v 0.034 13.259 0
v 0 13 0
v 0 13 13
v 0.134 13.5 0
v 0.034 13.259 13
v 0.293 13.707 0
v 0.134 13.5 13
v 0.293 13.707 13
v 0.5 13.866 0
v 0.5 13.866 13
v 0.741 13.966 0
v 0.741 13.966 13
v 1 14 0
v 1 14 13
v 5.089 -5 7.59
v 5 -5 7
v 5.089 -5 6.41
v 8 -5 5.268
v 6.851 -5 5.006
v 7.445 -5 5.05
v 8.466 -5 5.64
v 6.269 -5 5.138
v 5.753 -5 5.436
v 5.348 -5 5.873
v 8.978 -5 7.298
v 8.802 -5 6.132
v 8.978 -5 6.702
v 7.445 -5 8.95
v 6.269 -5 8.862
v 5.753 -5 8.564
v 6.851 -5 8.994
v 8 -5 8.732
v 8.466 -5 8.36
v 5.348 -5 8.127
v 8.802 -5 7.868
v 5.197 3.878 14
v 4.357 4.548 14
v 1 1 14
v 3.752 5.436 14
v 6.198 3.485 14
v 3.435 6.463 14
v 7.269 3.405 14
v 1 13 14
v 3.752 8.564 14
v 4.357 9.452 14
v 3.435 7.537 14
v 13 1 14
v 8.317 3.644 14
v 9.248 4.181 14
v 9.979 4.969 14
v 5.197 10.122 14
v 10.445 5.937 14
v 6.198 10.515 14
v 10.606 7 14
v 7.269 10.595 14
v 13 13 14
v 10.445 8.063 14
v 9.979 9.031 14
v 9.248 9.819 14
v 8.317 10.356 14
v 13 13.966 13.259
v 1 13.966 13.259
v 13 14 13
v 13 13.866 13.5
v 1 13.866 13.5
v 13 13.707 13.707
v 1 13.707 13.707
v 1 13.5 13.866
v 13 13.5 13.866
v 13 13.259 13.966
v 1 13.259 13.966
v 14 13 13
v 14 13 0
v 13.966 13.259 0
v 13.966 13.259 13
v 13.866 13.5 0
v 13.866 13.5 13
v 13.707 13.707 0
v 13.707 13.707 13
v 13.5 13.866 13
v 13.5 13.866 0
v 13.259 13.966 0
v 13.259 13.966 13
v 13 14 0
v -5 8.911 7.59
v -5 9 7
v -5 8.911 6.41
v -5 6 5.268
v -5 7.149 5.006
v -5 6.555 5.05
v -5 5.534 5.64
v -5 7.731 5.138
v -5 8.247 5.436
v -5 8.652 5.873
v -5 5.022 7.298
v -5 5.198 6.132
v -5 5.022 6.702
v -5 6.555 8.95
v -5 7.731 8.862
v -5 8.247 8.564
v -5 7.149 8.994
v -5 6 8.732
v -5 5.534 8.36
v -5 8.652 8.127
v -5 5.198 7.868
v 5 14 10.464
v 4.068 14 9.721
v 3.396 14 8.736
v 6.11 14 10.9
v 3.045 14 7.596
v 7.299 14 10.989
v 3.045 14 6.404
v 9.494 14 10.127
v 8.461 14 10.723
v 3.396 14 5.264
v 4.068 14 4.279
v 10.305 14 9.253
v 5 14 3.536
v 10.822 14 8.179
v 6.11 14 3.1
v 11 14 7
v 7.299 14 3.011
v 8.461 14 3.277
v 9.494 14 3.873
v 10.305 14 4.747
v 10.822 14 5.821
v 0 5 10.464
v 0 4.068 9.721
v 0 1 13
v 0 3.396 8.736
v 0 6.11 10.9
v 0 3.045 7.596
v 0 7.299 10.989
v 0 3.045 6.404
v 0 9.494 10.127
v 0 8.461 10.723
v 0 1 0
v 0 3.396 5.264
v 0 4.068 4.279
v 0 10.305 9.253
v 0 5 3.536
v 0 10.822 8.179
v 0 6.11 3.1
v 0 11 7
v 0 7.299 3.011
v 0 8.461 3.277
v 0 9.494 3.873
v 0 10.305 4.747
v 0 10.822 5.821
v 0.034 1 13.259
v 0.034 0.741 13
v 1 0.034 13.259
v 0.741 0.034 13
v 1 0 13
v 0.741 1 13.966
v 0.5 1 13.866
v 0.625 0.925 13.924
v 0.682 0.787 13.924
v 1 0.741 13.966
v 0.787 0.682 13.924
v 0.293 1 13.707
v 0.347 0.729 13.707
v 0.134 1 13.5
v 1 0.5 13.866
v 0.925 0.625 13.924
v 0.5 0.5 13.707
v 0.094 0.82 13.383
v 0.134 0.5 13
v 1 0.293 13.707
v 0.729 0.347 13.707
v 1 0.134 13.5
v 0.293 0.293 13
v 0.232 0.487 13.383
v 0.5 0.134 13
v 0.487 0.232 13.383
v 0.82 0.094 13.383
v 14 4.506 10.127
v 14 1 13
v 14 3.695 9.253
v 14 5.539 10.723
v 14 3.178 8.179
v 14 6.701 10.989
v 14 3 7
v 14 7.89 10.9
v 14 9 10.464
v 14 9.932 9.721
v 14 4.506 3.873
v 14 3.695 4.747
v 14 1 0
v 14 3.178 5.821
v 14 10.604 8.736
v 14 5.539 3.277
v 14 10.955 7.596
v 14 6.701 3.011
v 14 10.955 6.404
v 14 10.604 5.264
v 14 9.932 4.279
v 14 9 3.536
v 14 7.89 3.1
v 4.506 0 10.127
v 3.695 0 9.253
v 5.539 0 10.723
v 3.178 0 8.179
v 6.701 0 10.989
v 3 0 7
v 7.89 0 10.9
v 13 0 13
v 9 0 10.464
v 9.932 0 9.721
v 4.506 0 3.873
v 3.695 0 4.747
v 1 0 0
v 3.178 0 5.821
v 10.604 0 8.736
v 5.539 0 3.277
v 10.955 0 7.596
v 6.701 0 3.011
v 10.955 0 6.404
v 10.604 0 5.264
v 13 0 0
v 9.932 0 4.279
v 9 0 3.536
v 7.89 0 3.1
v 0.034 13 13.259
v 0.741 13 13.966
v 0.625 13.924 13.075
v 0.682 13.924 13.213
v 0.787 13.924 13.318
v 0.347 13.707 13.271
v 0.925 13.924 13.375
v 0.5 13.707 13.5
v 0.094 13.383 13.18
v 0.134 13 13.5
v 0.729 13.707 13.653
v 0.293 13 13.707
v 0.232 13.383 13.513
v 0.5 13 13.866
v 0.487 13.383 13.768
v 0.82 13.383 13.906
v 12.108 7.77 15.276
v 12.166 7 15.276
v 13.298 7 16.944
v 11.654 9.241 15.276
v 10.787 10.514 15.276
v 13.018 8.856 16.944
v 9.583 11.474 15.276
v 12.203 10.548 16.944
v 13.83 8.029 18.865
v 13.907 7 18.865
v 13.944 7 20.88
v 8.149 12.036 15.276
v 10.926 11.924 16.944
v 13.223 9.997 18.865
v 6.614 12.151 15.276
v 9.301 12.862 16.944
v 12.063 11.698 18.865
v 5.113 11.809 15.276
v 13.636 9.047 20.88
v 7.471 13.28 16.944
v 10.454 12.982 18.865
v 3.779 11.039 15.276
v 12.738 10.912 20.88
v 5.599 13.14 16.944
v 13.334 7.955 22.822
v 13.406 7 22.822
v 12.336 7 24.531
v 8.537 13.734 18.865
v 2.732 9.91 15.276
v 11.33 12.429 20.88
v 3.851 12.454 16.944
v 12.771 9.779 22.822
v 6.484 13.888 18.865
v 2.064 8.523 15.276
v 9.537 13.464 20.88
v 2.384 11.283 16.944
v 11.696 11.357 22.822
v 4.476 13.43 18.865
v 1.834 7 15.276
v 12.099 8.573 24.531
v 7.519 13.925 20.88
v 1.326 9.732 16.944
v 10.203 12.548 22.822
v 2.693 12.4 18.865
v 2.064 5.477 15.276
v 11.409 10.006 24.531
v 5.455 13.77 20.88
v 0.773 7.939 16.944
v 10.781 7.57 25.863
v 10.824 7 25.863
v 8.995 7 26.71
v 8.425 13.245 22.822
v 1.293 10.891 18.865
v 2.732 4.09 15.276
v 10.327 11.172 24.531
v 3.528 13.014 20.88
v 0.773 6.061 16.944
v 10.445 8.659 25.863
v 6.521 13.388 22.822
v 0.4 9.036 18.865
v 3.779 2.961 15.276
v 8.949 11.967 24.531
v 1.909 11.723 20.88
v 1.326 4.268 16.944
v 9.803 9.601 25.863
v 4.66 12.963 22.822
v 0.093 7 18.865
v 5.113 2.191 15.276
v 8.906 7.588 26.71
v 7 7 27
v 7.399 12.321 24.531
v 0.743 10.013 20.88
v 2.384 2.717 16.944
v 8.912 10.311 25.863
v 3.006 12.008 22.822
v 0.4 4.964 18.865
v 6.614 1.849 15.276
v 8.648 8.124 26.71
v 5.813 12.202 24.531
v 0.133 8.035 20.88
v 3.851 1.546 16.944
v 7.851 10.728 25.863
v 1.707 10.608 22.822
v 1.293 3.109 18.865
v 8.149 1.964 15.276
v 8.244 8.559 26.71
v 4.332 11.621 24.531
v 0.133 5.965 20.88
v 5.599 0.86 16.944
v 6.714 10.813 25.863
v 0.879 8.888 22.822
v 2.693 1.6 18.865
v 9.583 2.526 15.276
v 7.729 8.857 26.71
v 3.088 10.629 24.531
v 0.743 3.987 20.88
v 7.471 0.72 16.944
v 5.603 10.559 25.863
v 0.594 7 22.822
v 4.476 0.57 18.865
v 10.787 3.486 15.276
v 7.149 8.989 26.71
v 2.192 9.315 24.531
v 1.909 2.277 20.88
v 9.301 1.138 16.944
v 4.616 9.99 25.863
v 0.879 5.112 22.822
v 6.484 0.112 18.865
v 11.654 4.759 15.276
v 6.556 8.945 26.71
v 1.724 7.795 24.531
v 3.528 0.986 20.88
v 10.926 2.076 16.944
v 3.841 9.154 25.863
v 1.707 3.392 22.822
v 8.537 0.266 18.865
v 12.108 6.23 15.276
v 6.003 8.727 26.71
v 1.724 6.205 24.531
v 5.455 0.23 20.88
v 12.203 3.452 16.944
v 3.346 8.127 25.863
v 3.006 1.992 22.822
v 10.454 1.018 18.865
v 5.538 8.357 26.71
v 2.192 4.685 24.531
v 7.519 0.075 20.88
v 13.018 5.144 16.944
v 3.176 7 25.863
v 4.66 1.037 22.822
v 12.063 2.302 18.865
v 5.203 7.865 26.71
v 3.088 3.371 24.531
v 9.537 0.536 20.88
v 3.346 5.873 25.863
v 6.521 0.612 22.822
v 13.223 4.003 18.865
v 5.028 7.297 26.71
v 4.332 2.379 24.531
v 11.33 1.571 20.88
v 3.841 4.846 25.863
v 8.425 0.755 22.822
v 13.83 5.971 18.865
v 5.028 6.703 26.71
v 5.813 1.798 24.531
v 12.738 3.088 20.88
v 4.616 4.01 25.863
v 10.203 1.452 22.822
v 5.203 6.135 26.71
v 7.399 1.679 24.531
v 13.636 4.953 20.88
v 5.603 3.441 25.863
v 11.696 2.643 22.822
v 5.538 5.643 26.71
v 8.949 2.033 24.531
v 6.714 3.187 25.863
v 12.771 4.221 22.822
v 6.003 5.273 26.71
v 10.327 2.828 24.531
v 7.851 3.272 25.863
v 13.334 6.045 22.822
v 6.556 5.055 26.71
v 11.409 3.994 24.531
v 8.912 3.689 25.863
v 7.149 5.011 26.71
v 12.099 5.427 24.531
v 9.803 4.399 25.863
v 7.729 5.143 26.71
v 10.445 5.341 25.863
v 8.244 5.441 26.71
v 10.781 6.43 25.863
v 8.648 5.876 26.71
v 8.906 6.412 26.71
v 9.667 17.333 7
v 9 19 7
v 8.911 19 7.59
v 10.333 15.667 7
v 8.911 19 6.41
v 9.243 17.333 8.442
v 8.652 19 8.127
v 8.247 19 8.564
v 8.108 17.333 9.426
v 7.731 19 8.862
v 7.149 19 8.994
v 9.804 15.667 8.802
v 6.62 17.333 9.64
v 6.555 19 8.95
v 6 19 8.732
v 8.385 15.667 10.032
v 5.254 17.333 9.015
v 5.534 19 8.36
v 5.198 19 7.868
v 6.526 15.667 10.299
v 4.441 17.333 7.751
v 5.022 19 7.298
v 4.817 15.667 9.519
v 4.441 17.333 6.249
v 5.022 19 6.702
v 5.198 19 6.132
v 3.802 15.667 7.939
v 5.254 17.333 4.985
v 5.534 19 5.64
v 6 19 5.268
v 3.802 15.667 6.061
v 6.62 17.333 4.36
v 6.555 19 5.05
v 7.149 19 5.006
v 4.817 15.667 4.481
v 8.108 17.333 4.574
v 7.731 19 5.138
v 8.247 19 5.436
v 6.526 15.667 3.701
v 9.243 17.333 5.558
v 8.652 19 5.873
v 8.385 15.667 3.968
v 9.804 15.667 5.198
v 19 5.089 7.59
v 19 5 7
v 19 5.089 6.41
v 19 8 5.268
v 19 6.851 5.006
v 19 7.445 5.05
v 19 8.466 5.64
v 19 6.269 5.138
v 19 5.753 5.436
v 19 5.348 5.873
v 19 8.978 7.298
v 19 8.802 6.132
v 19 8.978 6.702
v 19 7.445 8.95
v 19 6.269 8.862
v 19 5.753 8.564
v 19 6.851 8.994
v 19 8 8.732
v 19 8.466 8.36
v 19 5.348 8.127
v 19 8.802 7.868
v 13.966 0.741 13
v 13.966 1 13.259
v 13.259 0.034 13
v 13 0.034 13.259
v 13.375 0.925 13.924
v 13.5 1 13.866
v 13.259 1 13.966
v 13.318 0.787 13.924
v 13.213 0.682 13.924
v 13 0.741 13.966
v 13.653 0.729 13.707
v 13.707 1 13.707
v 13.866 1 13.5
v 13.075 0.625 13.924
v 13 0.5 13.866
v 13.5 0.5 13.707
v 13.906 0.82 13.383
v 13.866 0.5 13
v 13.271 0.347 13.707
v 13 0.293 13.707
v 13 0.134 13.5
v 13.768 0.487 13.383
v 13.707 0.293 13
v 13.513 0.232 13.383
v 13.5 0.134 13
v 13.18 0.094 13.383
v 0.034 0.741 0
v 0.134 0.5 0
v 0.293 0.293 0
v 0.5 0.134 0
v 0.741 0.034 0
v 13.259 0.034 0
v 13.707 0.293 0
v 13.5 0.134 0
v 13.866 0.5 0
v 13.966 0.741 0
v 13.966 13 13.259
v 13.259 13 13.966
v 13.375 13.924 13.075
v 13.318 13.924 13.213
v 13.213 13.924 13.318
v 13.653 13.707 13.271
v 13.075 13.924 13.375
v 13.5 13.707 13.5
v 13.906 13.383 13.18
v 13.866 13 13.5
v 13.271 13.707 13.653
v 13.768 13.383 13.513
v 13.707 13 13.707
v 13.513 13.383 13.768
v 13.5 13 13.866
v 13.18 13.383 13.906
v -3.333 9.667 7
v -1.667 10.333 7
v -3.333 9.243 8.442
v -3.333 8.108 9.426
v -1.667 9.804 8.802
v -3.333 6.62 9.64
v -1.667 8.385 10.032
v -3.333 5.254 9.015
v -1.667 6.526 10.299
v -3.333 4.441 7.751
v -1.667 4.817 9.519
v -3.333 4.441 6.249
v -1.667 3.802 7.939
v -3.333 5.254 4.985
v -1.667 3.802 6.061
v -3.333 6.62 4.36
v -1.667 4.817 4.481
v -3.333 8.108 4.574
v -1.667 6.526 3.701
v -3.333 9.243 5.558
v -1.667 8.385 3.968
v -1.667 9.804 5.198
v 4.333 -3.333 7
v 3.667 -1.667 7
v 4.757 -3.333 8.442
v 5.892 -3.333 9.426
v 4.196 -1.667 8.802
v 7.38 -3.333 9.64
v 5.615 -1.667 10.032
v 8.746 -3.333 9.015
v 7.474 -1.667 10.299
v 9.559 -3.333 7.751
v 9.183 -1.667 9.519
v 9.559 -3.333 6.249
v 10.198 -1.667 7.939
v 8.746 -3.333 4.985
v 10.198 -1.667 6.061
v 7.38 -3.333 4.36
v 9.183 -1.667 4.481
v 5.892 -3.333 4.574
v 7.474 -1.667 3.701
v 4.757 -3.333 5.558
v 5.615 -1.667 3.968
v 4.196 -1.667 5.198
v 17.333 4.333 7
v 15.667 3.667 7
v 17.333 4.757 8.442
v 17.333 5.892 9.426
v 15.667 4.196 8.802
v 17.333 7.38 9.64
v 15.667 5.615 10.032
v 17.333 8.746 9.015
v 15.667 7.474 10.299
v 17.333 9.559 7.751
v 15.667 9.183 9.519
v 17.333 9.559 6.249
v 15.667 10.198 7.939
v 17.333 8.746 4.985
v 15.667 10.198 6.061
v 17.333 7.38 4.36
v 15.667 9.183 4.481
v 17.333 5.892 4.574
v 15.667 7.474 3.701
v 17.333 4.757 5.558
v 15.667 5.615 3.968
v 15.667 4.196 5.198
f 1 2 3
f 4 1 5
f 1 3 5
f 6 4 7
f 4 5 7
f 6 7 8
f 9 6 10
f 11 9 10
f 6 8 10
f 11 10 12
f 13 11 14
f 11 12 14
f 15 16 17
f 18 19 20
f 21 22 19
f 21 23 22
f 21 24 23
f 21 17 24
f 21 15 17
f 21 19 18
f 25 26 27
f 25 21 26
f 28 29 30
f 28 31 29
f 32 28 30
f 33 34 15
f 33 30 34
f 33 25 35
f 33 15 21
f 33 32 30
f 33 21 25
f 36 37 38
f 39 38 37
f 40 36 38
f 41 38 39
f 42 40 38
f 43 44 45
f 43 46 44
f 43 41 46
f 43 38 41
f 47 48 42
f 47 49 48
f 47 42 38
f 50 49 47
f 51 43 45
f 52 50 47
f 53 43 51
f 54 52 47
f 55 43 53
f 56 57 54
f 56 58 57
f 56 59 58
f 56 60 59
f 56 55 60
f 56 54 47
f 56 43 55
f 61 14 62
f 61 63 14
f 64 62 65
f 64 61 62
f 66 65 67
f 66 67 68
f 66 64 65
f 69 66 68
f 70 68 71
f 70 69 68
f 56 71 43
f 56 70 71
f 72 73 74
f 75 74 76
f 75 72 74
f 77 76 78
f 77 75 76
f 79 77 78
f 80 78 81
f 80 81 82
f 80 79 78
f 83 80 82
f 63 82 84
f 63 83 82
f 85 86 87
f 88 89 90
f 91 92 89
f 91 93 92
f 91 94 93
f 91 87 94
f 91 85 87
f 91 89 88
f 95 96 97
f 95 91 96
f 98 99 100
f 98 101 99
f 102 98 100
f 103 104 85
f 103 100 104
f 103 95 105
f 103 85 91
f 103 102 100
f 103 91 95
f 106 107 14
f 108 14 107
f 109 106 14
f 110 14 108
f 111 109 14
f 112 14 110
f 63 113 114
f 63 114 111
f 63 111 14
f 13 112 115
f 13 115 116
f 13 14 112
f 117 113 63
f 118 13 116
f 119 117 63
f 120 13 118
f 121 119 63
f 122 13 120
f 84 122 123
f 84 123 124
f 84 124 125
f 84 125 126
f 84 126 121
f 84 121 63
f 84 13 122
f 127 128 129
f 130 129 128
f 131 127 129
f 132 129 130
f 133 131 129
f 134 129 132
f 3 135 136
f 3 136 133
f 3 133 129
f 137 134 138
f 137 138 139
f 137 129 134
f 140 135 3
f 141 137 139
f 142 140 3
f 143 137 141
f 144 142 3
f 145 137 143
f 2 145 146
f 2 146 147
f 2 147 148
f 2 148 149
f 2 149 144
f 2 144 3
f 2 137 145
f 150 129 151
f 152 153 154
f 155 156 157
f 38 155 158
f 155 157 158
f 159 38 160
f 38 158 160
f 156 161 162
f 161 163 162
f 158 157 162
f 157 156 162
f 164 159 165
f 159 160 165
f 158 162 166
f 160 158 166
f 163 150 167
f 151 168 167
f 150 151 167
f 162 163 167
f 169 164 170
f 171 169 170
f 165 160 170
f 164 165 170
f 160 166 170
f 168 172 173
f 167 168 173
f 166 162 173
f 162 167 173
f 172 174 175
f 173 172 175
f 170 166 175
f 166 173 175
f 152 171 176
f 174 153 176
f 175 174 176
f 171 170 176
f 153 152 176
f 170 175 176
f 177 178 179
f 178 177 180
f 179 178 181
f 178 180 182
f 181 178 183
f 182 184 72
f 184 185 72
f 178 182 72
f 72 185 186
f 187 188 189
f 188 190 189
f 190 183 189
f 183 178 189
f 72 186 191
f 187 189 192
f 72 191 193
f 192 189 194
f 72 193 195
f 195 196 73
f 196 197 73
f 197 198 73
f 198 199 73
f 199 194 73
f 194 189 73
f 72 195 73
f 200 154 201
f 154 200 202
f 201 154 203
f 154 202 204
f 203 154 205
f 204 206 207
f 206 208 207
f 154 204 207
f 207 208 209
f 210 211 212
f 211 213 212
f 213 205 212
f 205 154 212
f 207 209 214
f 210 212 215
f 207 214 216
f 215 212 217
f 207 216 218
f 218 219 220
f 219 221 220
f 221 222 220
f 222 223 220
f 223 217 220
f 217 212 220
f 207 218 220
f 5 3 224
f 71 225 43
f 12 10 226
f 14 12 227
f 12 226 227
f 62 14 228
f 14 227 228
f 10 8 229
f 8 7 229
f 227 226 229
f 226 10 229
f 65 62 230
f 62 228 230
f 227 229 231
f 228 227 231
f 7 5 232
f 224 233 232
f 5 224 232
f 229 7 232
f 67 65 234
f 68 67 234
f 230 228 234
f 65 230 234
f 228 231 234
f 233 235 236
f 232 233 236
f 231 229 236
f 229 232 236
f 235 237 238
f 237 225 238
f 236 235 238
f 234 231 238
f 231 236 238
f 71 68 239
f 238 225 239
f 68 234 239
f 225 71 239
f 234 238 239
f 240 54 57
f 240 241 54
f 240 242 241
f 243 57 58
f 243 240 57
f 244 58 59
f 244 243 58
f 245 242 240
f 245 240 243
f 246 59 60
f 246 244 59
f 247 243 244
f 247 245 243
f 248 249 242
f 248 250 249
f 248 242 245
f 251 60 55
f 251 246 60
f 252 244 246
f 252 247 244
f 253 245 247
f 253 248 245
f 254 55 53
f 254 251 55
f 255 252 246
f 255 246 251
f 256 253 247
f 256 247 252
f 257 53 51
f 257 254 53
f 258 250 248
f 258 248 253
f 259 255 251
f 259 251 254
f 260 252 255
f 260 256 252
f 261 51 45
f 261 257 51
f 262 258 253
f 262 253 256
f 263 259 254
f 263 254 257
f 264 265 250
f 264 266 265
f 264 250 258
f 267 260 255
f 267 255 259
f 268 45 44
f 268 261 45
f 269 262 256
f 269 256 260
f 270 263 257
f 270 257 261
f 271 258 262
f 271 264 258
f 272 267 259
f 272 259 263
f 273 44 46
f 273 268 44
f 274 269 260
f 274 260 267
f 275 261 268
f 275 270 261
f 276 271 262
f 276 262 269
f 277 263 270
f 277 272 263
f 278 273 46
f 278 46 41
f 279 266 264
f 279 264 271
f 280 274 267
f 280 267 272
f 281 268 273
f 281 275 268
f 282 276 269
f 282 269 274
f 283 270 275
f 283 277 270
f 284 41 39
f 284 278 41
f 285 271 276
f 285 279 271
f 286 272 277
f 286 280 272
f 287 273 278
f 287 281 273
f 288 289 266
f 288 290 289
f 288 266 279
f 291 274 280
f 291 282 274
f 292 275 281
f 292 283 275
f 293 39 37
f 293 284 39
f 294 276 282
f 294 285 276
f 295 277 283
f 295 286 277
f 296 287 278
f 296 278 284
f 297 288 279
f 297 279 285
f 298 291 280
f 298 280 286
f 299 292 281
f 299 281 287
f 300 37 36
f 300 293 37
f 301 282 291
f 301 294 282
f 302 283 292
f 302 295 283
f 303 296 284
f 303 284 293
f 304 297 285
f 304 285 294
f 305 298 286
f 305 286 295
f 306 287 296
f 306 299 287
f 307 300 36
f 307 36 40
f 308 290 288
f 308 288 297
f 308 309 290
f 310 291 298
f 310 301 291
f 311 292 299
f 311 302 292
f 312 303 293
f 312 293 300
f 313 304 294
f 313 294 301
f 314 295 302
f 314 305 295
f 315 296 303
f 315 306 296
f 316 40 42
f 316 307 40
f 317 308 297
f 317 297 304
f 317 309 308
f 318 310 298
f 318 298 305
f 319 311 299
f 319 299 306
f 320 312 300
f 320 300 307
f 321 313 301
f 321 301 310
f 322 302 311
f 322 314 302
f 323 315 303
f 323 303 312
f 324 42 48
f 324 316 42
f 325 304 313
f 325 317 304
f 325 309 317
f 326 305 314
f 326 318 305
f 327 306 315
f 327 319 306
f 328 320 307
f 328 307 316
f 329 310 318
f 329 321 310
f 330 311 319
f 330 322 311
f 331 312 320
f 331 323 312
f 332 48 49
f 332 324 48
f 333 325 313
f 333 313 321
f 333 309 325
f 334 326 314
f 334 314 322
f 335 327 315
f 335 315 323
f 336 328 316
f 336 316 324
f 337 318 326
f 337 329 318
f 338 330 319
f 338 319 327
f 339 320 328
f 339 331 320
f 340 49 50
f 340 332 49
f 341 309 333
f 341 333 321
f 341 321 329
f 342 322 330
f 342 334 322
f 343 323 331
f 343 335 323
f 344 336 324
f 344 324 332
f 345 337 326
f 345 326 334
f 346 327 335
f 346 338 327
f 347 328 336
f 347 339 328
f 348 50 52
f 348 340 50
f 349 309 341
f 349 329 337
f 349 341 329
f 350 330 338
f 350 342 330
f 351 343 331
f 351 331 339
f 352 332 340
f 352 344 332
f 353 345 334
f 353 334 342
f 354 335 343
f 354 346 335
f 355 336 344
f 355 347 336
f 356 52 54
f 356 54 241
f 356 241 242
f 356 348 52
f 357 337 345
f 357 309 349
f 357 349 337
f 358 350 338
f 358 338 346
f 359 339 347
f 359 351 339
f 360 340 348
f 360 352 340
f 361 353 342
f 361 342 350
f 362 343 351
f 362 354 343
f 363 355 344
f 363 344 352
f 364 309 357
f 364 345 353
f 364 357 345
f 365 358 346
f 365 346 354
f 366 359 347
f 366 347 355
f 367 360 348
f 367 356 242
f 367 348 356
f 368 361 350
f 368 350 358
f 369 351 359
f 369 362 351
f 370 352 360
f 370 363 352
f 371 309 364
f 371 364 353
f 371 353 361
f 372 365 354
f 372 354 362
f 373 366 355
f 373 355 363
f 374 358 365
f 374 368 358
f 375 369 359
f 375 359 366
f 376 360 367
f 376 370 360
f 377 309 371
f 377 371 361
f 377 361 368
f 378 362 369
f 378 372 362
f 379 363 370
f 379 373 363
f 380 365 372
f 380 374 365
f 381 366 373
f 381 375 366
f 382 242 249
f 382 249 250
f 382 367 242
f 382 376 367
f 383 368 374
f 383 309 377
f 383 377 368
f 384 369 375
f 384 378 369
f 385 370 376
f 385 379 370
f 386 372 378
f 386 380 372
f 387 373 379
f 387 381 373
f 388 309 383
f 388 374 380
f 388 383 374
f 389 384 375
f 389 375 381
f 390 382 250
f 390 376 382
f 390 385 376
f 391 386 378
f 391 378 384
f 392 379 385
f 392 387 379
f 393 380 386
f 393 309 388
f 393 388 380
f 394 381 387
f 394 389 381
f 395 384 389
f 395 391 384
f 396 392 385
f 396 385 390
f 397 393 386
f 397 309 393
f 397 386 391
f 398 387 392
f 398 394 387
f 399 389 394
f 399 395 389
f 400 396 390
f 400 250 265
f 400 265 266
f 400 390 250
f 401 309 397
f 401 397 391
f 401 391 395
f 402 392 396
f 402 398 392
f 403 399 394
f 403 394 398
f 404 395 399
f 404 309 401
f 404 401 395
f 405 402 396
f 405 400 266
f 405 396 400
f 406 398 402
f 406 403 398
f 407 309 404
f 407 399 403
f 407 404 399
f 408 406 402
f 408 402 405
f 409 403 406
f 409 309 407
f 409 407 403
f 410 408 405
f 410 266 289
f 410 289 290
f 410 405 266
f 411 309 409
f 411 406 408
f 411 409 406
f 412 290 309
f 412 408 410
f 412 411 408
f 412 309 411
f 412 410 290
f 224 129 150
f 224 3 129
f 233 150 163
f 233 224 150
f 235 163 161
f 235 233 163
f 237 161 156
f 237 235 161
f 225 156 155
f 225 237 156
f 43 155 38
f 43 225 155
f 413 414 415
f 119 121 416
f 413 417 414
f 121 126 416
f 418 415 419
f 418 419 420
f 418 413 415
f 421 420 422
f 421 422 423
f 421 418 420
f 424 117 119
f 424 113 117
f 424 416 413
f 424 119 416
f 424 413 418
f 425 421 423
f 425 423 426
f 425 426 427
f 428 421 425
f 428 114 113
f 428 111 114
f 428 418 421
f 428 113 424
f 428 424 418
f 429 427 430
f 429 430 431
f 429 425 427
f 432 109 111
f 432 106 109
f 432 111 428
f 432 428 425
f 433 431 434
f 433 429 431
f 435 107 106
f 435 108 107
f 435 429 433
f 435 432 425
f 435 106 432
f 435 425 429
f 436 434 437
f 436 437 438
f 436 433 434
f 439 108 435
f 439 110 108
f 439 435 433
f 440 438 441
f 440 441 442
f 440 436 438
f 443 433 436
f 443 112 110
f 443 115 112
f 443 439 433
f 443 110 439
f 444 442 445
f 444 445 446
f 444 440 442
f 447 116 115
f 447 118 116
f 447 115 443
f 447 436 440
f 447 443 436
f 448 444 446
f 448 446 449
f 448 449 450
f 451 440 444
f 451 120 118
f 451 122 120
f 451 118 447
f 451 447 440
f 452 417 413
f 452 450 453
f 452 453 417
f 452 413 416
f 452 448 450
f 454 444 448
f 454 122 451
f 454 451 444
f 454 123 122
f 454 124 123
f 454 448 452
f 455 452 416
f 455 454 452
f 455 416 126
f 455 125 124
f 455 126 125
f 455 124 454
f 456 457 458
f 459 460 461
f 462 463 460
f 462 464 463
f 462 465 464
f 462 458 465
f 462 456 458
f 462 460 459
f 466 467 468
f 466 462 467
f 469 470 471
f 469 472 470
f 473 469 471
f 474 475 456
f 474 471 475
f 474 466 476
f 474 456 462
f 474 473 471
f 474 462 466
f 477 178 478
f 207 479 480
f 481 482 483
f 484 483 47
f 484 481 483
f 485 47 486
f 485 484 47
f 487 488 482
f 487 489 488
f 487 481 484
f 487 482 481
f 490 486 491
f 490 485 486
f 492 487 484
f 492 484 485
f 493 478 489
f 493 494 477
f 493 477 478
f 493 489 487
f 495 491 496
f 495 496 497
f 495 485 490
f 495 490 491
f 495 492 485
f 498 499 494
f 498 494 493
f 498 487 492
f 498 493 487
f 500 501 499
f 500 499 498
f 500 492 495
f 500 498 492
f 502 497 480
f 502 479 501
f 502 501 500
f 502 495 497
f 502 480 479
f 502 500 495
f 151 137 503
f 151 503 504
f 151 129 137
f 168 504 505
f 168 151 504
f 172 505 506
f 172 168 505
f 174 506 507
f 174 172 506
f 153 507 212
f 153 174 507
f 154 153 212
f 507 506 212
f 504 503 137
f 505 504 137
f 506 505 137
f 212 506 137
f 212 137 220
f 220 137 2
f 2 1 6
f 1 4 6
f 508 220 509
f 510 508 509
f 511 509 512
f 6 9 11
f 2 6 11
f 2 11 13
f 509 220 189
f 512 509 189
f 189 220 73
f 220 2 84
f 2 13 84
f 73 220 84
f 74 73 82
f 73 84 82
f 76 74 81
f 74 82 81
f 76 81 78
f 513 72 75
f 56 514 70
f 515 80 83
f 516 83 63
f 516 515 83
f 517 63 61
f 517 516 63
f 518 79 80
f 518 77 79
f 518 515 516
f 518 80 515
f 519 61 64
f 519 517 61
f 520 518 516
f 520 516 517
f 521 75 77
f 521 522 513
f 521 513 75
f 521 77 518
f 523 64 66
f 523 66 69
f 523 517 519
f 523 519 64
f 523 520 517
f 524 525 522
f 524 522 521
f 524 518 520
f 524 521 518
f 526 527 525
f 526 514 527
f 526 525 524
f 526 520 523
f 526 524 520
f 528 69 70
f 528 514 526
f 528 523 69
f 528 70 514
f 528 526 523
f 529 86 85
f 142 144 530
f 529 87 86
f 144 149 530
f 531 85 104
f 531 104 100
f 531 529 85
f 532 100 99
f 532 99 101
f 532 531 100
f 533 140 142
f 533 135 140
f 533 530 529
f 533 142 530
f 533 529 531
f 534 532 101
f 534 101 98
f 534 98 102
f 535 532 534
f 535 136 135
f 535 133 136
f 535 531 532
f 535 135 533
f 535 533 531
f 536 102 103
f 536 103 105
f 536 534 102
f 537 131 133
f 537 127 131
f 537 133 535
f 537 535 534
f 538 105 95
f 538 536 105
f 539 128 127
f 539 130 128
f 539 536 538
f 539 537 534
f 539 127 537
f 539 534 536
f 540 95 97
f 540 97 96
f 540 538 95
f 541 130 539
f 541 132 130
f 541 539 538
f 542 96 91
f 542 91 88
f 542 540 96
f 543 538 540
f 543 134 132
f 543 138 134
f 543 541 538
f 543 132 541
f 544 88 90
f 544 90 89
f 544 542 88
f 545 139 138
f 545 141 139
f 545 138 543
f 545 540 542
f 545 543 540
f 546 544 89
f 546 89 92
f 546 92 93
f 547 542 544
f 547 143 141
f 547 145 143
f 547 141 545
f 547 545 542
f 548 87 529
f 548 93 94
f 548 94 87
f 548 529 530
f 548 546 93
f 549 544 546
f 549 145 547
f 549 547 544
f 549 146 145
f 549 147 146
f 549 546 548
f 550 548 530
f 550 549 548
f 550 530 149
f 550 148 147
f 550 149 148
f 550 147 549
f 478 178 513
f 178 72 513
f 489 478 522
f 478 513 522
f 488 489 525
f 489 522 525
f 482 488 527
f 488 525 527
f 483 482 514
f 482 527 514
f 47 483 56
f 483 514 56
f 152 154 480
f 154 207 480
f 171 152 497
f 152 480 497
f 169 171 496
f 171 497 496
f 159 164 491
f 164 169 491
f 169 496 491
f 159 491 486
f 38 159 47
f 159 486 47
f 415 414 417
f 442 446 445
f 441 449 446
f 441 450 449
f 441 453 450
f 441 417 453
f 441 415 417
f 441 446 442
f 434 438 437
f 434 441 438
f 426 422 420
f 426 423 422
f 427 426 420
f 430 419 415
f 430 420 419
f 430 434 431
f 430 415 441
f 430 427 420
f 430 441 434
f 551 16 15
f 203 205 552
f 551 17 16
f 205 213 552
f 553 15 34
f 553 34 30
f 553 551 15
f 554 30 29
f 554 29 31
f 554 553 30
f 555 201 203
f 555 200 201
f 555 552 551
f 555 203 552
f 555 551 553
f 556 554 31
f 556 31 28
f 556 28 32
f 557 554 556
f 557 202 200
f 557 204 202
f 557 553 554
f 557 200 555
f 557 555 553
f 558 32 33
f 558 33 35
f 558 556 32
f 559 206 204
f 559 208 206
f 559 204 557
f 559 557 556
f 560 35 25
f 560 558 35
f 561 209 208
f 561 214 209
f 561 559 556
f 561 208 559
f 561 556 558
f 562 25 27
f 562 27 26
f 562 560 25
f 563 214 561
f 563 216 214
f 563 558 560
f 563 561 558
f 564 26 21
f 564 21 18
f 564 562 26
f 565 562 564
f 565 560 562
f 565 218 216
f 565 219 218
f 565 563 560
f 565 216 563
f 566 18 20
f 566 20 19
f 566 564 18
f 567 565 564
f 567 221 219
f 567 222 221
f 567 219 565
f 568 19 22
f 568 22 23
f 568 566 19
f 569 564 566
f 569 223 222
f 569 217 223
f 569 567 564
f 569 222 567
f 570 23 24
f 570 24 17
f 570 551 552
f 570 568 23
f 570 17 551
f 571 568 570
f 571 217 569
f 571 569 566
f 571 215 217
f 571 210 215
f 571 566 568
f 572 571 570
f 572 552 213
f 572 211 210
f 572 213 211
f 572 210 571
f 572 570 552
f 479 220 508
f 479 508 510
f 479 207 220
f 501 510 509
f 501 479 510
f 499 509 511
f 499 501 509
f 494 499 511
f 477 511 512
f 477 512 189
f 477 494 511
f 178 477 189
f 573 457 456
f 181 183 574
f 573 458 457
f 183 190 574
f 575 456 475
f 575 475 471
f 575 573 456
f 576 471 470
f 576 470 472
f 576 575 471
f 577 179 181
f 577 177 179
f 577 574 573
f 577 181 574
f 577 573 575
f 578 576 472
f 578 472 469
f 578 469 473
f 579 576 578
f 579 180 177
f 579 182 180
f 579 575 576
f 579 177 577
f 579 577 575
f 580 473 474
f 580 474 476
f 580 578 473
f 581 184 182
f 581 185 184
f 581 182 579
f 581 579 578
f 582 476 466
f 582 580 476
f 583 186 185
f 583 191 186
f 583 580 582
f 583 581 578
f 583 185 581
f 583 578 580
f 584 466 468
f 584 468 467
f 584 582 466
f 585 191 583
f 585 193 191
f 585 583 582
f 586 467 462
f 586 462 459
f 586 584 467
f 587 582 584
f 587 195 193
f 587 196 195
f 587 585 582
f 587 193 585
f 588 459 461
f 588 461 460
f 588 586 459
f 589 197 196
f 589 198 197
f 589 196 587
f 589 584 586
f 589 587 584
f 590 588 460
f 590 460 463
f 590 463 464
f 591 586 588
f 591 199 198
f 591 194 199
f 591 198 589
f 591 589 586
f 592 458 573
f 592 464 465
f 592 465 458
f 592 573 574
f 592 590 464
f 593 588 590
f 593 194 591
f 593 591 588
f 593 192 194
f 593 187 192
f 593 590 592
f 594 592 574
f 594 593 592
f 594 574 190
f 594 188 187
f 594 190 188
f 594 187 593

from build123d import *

# Parameters (mm, degrees)
BOX_W     = 14
BOX_H     = 14
BOX_DEPTH = 14
FILLET_R  = 1


with BuildPart() as cone:
    # Cone → Cone (revolve)
    with BuildSketch(Plane(origin=(7, -5, 7), x_dir=(-1, 0, 0), z_dir=(0, 0, -1))):
        Polygon((0, 0), (2, 0), (4, 5), (0, 5), align=None)
    revolve(axis=Axis((7, -5, 7), (0, 1, 0)))


with BuildPart() as cone001:
    # Cone001 → Cone001 (revolve)
    with BuildSketch(Plane(origin=(19, 7, 7), x_dir=(0, -1, 0), z_dir=(0, 0, -1))):
        Polygon((0, 0), (2, 0), (4, 5), (0, 5), align=None)
    revolve(axis=Axis((19, 7, 7), (-1, 0, 0)))


with BuildPart() as cone002:
    # Cone002 → Cone002 (revolve)
    with BuildSketch(Plane(origin=(7, 19, 7), x_dir=(1, 0, 0), z_dir=(0, 0, -1))):
        Polygon((0, 0), (2, 0), (4, 5), (0, 5), align=None)
    revolve(axis=Axis((7, 19, 7), (0, -1, 0)))


with BuildPart() as cone003:
    # Cone003 → Cone003 (revolve)
    with BuildSketch(Plane(origin=(-5, 7, 7), x_dir=(0, 1, 0), z_dir=(0, 0, -1))):
        Polygon((0, 0), (2, 0), (4, 5), (0, 5), align=None)
    revolve(axis=Axis((-5, 7, 7), (1, 0, 0)))


with BuildPart() as fillet_body:
    # Box → Box (new body)
    with BuildSketch(Plane.XY):
        with Locations((7, 7)):
            Rectangle(BOX_W, BOX_H)
    extrude(amount=BOX_DEPTH)

    # Fillet
    fillet_edges = [fillet_body.edges().sort_by_distance(p)[0] for p in [
        (0, 0, 7),
        (0, 7, 14),
        (0, 14, 7),
        (14, 0, 7),
        (14, 7, 14),
        (14, 14, 7),
        (7, 0, 14),
        (7, 14, 14),
    ]]
    fillet(fillet_edges, radius=FILLET_R)


with BuildPart() as fusion:
    # Sphere → Sphere (revolve)
    with BuildSketch(Plane(origin=(7, 7, 20), x_dir=(1, 0, 0), z_dir=(0, -1, 0))):
        with BuildLine():
            ThreePointArc((0, -7), (7, 0), (0, 7))
            Line((0, 7), (0, -7))
        make_face()
    revolve(axis=Axis((7, 7, 20), (0, 0, 1)))

    # Fusion: union Cone, Cone001, Cone002, Cone003, Fillet body
    add(cone.part)
    add(cone001.part)
    add(cone002.part)
    add(cone003.part)
    add(fillet_body.part)


solid = fusion.part
